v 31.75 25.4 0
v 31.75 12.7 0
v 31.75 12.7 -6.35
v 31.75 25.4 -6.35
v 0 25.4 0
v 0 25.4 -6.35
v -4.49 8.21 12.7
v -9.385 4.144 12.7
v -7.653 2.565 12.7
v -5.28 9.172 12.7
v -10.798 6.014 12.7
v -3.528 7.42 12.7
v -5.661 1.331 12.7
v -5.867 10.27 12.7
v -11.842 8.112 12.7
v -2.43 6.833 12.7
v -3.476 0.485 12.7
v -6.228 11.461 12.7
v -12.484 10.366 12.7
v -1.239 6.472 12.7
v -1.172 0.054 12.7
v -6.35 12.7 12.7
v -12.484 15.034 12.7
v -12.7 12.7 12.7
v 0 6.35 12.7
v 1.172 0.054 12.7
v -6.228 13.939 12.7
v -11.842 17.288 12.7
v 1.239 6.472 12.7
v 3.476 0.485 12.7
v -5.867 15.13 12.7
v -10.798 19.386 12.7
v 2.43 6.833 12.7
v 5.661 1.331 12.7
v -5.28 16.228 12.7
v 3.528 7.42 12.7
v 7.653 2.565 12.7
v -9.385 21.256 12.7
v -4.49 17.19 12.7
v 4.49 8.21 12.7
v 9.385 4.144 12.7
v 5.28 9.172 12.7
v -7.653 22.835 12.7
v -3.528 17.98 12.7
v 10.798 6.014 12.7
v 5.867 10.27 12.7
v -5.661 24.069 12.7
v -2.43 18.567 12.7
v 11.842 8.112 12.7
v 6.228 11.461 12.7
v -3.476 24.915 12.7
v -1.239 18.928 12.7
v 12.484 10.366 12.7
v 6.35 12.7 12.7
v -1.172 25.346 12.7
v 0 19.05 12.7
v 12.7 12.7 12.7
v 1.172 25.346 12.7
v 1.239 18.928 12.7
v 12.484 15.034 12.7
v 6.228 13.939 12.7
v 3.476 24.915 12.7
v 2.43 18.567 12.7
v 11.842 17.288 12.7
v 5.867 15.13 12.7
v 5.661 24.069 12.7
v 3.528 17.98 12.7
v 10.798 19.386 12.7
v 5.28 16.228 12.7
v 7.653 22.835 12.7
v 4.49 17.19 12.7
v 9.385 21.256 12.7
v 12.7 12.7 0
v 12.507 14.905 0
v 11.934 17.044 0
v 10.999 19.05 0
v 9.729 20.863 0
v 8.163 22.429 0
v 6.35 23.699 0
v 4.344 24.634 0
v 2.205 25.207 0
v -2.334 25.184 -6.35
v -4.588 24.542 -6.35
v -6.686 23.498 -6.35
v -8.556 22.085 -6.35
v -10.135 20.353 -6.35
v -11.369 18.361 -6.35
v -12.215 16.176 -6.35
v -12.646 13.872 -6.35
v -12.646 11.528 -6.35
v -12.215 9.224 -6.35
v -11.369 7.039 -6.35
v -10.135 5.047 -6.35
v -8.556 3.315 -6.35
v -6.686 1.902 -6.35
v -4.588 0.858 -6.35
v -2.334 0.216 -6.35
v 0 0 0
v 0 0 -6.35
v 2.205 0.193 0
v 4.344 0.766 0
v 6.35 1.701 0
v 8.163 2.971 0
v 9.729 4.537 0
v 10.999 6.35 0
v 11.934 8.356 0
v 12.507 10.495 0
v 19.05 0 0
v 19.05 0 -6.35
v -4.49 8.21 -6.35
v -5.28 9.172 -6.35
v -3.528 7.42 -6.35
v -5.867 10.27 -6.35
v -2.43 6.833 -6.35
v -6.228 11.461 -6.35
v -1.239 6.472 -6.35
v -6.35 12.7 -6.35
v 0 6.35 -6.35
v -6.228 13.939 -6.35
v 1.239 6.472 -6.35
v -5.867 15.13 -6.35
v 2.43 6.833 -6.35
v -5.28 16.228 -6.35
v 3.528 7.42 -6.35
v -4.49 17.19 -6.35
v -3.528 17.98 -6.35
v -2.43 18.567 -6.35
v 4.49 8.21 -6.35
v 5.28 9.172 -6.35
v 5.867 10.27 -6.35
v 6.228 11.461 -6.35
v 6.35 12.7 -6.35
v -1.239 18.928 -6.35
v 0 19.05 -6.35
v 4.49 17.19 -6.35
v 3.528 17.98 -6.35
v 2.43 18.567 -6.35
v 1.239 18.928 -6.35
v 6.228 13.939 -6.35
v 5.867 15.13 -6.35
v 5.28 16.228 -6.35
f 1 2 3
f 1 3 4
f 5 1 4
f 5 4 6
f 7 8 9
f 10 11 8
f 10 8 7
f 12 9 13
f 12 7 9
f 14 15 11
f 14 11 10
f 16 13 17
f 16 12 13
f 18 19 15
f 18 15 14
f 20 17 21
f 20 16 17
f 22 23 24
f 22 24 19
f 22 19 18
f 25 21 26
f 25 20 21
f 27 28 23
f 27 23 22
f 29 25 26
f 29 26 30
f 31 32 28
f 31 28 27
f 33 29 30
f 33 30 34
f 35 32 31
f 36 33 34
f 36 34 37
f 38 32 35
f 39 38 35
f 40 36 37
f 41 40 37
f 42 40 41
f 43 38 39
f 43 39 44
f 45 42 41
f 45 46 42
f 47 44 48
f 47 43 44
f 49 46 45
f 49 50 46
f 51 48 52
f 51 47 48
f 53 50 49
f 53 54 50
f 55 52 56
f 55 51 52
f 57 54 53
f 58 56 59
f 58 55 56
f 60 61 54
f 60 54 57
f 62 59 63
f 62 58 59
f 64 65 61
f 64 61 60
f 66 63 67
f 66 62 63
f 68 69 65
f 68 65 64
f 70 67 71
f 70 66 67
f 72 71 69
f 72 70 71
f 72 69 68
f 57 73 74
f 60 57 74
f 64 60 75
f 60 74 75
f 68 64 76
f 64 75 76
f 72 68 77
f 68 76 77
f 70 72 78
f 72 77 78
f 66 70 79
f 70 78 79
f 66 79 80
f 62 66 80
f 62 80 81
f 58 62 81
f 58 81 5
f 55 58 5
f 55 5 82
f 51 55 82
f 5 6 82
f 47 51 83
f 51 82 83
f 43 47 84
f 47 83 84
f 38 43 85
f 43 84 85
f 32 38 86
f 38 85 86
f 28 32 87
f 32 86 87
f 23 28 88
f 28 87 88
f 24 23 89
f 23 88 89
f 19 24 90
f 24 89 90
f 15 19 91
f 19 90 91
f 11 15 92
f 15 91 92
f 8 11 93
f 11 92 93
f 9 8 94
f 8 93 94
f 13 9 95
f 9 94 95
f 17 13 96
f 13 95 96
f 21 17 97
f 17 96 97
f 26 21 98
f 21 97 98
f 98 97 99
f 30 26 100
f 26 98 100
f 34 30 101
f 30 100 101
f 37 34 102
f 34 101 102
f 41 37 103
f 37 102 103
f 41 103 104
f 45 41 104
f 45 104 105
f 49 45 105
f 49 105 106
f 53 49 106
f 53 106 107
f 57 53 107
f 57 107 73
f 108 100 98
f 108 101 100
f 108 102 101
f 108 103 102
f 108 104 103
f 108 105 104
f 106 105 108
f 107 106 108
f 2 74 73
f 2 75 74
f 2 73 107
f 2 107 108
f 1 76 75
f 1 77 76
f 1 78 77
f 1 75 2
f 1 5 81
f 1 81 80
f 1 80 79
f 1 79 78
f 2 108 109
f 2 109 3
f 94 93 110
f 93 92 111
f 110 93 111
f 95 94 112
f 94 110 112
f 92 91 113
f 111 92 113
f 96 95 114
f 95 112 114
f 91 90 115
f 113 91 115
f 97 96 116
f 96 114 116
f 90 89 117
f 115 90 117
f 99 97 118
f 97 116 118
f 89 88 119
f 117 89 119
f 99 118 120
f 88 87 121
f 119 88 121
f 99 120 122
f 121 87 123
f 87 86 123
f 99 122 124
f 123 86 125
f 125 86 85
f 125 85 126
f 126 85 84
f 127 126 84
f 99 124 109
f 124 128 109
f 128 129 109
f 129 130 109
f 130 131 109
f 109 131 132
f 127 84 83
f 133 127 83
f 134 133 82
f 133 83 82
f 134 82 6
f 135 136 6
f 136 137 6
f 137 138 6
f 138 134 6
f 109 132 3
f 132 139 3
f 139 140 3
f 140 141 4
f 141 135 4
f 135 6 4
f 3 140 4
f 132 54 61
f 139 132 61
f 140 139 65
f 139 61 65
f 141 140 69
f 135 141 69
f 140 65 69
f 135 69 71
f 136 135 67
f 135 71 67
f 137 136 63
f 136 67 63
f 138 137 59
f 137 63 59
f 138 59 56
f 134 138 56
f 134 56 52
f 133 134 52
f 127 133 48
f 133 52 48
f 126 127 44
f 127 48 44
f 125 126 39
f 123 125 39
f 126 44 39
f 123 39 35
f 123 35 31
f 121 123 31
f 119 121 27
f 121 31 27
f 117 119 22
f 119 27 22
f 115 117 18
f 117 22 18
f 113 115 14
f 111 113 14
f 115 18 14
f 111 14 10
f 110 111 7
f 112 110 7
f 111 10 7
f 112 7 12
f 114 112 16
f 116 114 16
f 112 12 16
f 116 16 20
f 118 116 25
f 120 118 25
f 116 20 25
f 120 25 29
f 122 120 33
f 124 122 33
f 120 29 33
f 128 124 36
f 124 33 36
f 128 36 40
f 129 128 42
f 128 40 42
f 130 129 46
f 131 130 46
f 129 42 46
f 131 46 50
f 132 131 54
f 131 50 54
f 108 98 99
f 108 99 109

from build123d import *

# Parameters (mm, degrees)
F1_DEPTH = 6.35
F3_DEPTH = 6.35
F2_R     = 12.7
F4_DEPTH = 12.7
F5_R     = 6.35
F6_DEPTH = 19.05


with BuildPart() as f1:
    # F0 (on Top) → F1 (new body)
    with BuildSketch(Plane.XY):
        Polygon((0, 25.4), (0, 0), (19.05, 0), (31.75, 12.7), (31.75, 25.4), align=None)
    extrude(amount=-F1_DEPTH)

    # F2 (on face) → F3 (join)
    with BuildSketch(Plane.XY):
        with BuildLine():
            Line((0, 0), (0, 25.4))
            ThreePointArc((0, 25.4), (-12.7, 12.7), (0, 0))
        make_face()
    extrude(amount=-F3_DEPTH)

    # F2 (on face) → F4 (join)
    with BuildSketch(Plane.XY):
        with Locations((0, 12.7)):
            Circle(F2_R)
    extrude(amount=F4_DEPTH)

    # F5 (on face) → F6 (cut)
    with BuildSketch(Plane.XY.offset(12.7)):
        with Locations((0, 12.7)):
            Circle(F5_R)
    extrude(amount=-F6_DEPTH, mode=Mode.SUBTRACT)


solid = f1.part
